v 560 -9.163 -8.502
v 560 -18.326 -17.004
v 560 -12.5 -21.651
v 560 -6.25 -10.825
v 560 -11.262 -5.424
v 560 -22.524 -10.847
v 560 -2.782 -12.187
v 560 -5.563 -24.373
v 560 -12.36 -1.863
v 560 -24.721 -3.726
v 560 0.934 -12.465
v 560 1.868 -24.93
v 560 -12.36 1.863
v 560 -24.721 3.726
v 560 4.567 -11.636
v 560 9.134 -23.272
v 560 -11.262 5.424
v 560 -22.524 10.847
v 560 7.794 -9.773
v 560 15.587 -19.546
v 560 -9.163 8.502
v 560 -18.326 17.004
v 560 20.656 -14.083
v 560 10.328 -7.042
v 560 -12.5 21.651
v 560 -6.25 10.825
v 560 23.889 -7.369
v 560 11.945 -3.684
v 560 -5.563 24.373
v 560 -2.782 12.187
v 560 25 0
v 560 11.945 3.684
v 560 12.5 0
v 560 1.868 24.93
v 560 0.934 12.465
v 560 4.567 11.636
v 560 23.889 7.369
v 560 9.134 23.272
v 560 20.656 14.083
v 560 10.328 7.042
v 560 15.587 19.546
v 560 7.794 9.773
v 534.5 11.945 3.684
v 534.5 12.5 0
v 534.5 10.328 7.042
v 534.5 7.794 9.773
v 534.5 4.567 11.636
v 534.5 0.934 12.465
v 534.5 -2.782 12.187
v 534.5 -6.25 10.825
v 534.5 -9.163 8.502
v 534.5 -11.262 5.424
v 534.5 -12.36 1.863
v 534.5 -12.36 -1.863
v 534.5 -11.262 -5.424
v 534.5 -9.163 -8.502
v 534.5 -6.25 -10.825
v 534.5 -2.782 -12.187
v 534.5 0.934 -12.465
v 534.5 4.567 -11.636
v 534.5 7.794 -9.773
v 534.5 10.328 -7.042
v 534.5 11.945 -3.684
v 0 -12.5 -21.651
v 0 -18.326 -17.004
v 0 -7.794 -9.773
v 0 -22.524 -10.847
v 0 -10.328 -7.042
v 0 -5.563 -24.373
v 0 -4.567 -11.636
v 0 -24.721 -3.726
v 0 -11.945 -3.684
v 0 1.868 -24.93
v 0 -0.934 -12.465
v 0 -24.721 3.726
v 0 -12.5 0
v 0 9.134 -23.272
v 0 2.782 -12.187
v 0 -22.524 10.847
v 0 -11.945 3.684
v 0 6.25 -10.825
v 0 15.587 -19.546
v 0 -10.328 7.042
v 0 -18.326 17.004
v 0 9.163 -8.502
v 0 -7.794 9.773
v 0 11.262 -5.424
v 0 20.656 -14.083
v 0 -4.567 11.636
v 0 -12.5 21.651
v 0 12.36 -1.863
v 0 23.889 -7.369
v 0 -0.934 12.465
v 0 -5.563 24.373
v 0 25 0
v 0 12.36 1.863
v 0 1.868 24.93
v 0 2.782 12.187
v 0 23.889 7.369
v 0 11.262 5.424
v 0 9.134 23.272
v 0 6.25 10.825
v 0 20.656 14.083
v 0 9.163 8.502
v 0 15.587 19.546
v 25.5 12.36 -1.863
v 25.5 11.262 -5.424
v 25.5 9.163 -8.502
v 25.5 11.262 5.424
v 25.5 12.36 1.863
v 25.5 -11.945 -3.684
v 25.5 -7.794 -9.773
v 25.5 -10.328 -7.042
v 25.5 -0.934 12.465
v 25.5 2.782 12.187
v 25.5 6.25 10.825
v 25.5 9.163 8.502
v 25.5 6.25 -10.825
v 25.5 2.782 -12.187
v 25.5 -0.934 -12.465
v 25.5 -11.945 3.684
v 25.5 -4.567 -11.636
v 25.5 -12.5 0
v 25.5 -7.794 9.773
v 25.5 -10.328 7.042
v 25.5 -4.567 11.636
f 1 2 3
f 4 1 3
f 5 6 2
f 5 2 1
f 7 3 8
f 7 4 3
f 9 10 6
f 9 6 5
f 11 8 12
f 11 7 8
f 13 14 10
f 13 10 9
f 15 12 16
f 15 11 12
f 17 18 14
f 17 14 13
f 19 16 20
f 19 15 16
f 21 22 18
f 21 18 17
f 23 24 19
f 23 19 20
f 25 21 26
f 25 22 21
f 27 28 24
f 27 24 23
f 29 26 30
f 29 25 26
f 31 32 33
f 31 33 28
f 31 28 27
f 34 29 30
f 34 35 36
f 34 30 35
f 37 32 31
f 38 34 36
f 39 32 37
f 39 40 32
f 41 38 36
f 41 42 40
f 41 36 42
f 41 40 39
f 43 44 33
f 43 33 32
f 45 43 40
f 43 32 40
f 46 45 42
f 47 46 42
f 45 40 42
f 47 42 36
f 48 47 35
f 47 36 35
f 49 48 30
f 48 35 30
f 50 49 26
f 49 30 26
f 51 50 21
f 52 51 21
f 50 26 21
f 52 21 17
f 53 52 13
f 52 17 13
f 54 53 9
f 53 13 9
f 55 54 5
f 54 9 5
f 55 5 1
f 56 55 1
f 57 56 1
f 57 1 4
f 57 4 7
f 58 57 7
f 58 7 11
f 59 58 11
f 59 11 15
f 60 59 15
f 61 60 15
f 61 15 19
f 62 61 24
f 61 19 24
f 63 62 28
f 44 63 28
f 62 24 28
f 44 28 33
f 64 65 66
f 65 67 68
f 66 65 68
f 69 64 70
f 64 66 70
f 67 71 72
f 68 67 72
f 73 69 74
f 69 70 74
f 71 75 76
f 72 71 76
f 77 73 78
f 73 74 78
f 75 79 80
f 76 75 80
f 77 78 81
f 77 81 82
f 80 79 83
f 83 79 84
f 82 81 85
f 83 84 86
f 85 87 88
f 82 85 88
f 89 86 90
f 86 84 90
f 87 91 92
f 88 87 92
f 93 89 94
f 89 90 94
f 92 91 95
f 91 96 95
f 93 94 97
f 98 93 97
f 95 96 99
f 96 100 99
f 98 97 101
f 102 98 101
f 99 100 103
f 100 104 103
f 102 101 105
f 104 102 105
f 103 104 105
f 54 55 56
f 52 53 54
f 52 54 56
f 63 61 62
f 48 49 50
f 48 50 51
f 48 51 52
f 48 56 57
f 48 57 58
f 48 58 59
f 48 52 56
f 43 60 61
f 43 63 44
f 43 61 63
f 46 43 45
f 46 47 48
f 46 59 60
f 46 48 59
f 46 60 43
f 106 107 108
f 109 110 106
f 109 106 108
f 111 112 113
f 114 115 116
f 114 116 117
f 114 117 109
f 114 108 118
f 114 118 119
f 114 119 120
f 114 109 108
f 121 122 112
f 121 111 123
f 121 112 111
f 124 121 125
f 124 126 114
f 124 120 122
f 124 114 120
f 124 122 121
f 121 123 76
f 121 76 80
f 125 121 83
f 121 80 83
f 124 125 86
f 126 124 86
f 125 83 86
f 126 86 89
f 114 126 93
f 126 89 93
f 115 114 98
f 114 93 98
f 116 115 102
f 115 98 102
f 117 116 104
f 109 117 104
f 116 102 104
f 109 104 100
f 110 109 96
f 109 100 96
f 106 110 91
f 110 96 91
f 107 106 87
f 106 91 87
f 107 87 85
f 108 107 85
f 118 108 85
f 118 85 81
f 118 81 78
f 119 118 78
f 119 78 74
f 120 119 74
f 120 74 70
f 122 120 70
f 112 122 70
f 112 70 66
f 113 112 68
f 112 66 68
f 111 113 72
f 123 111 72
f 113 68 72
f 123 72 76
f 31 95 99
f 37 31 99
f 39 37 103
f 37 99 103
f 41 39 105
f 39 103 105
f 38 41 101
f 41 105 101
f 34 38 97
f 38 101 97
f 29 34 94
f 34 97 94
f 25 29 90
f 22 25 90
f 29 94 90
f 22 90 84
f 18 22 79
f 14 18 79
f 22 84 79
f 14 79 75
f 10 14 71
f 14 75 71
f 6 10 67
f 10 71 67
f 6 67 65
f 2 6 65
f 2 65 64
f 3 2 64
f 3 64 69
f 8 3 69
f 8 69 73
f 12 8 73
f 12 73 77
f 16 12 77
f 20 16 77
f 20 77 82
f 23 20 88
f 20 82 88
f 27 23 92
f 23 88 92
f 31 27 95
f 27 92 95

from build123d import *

# Parameters (mm, degrees)
F0_R     = 25
F1_DEPTH = 560
F2_R     = 12.5
F3_DEPTH = 25.5
F4_R     = 12.5
F5_DEPTH = 25.5


with BuildPart() as f1:
    # F0 (on Right) → F1 (new body)
    with BuildSketch(Plane.YZ):
        Circle(F0_R)
    extrude(amount=F1_DEPTH)

    # F2 (on face) → F3 (cut)
    with BuildSketch(Plane(origin=(0, 0, 0), x_dir=(0, -1, 0), z_dir=(-1, 0, 0))):
        Circle(F2_R)
    extrude(amount=-F3_DEPTH, mode=Mode.SUBTRACT)

    # F4 (on face) → F5 (cut)
    with BuildSketch(Plane.YZ.offset(560)):
        Circle(F4_R)
    extrude(amount=-F5_DEPTH, mode=Mode.SUBTRACT)


solid = f1.part
